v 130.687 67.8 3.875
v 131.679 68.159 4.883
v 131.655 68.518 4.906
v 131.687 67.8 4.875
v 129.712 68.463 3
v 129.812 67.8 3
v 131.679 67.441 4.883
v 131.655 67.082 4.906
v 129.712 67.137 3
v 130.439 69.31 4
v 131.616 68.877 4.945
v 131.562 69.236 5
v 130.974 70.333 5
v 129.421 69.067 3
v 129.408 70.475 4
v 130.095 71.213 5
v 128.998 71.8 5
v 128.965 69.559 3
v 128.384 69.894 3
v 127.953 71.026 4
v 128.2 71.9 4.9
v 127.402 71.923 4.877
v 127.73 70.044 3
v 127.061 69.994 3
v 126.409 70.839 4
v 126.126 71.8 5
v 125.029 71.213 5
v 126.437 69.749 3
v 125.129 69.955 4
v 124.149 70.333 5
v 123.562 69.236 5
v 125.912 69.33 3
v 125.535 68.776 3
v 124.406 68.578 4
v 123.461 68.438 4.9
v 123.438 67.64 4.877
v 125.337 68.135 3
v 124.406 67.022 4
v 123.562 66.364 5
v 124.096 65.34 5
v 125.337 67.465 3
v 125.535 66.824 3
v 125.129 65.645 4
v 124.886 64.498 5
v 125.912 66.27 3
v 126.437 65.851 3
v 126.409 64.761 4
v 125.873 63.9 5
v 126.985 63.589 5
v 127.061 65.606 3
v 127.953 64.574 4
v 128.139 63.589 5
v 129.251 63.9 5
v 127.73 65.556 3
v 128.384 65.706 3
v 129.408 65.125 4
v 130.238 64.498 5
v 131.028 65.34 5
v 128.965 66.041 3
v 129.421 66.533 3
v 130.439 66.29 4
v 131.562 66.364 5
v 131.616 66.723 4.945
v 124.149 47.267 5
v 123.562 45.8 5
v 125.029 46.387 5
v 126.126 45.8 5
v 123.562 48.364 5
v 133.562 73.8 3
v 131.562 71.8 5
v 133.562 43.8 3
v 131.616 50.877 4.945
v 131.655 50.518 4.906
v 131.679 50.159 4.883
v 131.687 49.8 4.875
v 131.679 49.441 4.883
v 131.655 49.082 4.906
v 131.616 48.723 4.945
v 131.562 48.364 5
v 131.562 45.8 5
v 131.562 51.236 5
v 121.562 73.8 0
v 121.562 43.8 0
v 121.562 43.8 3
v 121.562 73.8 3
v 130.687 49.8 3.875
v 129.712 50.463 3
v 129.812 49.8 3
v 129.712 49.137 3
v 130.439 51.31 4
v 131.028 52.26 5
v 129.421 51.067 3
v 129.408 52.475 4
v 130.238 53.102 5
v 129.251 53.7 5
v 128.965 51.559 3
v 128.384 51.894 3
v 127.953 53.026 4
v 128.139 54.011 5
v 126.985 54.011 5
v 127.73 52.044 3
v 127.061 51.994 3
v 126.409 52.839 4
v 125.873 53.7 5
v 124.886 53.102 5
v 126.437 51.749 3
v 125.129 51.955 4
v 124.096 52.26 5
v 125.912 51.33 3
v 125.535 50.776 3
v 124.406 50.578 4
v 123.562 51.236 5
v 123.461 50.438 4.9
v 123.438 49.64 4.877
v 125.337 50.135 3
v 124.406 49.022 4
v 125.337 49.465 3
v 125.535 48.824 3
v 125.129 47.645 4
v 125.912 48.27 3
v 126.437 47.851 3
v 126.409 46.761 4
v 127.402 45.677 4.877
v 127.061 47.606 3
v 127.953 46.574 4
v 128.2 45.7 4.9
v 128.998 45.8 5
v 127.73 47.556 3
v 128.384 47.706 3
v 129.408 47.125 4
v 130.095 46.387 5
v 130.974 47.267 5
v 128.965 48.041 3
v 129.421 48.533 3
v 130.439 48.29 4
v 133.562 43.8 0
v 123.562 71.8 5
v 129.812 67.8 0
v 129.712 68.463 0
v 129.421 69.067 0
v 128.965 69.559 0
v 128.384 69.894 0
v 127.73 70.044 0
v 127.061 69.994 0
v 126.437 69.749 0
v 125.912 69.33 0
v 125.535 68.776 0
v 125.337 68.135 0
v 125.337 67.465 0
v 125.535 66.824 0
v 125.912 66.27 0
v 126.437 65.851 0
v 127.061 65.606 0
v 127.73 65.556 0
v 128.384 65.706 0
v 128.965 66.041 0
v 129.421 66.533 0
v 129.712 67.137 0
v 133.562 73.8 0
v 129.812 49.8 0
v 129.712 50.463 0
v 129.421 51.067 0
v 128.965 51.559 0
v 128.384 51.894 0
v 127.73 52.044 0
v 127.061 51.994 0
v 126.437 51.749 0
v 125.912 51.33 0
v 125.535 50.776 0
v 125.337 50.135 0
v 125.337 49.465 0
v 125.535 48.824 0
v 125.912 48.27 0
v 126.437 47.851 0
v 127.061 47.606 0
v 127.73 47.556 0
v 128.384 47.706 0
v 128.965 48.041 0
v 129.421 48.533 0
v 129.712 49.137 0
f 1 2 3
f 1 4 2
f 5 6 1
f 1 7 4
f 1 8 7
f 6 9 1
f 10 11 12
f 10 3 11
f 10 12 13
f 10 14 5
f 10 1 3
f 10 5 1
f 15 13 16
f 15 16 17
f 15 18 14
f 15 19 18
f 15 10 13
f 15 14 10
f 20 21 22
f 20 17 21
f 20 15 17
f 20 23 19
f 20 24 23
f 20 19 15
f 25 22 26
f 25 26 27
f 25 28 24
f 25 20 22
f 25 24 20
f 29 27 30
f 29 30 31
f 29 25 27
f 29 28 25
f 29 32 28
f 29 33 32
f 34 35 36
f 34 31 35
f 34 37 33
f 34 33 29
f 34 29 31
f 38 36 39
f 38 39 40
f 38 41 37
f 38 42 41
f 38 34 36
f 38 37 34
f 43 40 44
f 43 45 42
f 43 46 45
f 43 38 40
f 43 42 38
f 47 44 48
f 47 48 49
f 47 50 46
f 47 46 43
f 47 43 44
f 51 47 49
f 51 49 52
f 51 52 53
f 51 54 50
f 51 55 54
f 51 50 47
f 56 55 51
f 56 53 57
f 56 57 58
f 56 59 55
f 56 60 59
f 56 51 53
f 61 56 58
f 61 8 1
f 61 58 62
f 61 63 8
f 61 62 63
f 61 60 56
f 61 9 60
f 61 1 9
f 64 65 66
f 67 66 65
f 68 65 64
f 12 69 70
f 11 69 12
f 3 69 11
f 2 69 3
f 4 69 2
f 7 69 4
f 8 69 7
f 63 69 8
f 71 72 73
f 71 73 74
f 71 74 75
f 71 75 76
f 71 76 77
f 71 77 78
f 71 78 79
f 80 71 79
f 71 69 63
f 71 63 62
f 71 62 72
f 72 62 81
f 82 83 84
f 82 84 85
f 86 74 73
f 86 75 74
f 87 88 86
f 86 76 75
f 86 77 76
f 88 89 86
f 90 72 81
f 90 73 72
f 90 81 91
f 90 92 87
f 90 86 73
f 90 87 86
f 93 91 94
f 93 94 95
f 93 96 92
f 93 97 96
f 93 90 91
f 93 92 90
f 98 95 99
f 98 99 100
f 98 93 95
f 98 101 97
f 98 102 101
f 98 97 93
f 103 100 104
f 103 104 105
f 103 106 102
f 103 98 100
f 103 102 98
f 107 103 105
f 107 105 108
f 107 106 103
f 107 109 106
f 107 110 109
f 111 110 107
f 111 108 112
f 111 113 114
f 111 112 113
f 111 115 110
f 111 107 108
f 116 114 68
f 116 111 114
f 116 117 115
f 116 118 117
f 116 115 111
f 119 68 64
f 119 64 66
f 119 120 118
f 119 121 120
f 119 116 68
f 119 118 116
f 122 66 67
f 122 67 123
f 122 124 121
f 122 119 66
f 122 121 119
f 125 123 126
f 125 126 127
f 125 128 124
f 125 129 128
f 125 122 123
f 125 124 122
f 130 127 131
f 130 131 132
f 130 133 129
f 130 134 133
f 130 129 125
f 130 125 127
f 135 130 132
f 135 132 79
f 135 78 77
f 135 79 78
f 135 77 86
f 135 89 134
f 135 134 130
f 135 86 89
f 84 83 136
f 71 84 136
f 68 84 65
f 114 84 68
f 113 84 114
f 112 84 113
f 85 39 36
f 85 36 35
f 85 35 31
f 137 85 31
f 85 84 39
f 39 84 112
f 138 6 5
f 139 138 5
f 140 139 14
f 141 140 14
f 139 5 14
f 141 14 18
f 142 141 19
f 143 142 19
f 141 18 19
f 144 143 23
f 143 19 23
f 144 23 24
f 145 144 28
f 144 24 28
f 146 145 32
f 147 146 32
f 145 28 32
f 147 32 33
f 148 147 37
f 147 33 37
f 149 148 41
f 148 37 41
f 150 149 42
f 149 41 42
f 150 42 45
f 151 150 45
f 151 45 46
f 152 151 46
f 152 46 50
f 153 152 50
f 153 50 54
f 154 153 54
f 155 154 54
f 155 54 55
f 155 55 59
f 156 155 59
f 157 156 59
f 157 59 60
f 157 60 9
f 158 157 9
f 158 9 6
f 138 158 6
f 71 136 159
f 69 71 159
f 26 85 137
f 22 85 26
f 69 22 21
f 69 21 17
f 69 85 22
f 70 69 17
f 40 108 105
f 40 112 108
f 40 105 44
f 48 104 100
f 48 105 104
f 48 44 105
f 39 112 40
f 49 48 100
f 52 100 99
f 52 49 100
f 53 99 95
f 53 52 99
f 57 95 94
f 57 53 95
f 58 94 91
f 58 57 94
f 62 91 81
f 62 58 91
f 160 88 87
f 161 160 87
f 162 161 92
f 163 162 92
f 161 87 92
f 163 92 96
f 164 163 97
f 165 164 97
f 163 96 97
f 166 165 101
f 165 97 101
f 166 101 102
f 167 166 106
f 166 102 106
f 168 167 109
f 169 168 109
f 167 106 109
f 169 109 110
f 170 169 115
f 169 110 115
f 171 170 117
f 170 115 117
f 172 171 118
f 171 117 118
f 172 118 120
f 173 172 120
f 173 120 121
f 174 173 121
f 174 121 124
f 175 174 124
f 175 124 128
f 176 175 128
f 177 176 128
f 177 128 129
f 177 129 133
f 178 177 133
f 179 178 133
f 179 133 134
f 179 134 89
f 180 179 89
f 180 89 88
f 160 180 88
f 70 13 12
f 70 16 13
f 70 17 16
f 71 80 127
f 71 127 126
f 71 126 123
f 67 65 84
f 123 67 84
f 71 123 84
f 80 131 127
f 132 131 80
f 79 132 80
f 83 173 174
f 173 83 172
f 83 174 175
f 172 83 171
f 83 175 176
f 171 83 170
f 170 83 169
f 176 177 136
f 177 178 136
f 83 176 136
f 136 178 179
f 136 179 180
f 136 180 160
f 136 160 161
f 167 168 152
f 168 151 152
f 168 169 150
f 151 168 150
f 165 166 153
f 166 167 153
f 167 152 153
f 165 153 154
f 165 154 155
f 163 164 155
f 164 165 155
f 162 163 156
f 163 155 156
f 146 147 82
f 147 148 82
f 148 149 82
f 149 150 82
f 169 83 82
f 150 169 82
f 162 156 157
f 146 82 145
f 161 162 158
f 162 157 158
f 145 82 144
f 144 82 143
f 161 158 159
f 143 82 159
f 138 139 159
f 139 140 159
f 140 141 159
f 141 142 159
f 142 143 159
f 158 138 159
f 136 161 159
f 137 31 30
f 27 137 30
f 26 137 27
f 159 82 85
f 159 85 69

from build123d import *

# Parameters (mm, degrees)
SKETCH1_W           = 12
SKETCH1_H           = 30
BOSS_EXTRUDE1_DEPTH = 5
SKETCH2_R           = 2.25
CUT_EXTRUDE1_DEPTH  = 153.676695316
CHAMFER1_SIZE       = 2


with BuildPart() as part:
    # Sketch1 → Boss-Extrude1 (new body)
    with BuildSketch(Plane.XY):
        with Locations((127.56172091, 58.8)):
            Rectangle(SKETCH1_W, SKETCH1_H)
    extrude(amount=BOSS_EXTRUDE1_DEPTH)

    # Sketch2 → Cut-Extrude1 (cut, through all)
    with BuildSketch(Plane.XY.offset(5)):
        with Locations((127.56172091, 67.8)):
            Circle(SKETCH2_R)
        with Locations((127.56172091, 49.8)):
            Circle(SKETCH2_R)
    extrude(amount=-CUT_EXTRUDE1_DEPTH, mode=Mode.SUBTRACT)

    # Chamfer1
    # the kernel refuses this chamfer: 2 mm, written as the material it takes off along each edge
    with BuildSketch(Plane(origin=(133.56172091, 38.656634024, 5), x_dir=(0.027495876610582174, 0, -0.9996219169112968), z_dir=(0, 1, 0)), Plane(origin=(121.56172091, 78.943365976, 5), x_dir=(-0.02749587661058908, 0, -0.9996219169112968), z_dir=(0, -1, 0))) as chamfer1_piece_1:
        Polygon((CHAMFER1_SIZE * 0.999621916911, CHAMFER1_SIZE * 0.0274958766106), (-CHAMFER1_SIZE * 0.0274958766106, CHAMFER1_SIZE * 0.999621916911), (0, 0), align=None)
    extrude(amount=40.286731952, mode=Mode.SUBTRACT)
    with BuildSketch(Plane(origin=(127.56172091, 67.8, 5), x_dir=(1, 0, 0), z_dir=(0, -1, 0))) as chamfer1_piece_2:
        Polygon((2.25 + CHAMFER1_SIZE, 0), (2.25, -CHAMFER1_SIZE), (2.25, 0), align=None)
    revolve(axis=Axis((127.56172091, 67.8, 5), (0, 0, 1)), mode=Mode.SUBTRACT)
    with BuildSketch(Plane(origin=(138.705086886, 73.8, 5), x_dir=(0, 0.02749587661058908, -0.9996219169112968), z_dir=(-1, 0, 0))) as chamfer1_piece_3:
        Polygon((CHAMFER1_SIZE * 0.999621916911, CHAMFER1_SIZE * 0.0274958766106), (-CHAMFER1_SIZE * 0.0274958766106, CHAMFER1_SIZE * 0.999621916911), (0, 0), align=None)
    extrude(amount=22.286731952, mode=Mode.SUBTRACT)
    with BuildSketch(Plane(origin=(127.56172091, 49.8, 5), x_dir=(1, 0, 0), z_dir=(0, -1, 0))) as chamfer1_piece_4:
        Polygon((2.25 + CHAMFER1_SIZE, 0), (2.25, -CHAMFER1_SIZE), (2.25, 0), align=None)
    revolve(axis=Axis((127.56172091, 49.8, 5), (0, 0, 1)), mode=Mode.SUBTRACT)
    with BuildSketch(Plane(origin=(116.418354934, 43.8, 5), x_dir=(1.1837901526131779e-15, 0.9996219169112968, 0.02749587661058651), z_dir=(1, 0, 0))) as chamfer1_piece_5:
        Polygon((CHAMFER1_SIZE * 0.999621916911, -CHAMFER1_SIZE * 0.0274958766106), (-CHAMFER1_SIZE * 0.0274958766106, -CHAMFER1_SIZE * 0.999621916911), (0, 0), align=None)
    extrude(amount=22.286731952, mode=Mode.SUBTRACT)


solid = part.part
